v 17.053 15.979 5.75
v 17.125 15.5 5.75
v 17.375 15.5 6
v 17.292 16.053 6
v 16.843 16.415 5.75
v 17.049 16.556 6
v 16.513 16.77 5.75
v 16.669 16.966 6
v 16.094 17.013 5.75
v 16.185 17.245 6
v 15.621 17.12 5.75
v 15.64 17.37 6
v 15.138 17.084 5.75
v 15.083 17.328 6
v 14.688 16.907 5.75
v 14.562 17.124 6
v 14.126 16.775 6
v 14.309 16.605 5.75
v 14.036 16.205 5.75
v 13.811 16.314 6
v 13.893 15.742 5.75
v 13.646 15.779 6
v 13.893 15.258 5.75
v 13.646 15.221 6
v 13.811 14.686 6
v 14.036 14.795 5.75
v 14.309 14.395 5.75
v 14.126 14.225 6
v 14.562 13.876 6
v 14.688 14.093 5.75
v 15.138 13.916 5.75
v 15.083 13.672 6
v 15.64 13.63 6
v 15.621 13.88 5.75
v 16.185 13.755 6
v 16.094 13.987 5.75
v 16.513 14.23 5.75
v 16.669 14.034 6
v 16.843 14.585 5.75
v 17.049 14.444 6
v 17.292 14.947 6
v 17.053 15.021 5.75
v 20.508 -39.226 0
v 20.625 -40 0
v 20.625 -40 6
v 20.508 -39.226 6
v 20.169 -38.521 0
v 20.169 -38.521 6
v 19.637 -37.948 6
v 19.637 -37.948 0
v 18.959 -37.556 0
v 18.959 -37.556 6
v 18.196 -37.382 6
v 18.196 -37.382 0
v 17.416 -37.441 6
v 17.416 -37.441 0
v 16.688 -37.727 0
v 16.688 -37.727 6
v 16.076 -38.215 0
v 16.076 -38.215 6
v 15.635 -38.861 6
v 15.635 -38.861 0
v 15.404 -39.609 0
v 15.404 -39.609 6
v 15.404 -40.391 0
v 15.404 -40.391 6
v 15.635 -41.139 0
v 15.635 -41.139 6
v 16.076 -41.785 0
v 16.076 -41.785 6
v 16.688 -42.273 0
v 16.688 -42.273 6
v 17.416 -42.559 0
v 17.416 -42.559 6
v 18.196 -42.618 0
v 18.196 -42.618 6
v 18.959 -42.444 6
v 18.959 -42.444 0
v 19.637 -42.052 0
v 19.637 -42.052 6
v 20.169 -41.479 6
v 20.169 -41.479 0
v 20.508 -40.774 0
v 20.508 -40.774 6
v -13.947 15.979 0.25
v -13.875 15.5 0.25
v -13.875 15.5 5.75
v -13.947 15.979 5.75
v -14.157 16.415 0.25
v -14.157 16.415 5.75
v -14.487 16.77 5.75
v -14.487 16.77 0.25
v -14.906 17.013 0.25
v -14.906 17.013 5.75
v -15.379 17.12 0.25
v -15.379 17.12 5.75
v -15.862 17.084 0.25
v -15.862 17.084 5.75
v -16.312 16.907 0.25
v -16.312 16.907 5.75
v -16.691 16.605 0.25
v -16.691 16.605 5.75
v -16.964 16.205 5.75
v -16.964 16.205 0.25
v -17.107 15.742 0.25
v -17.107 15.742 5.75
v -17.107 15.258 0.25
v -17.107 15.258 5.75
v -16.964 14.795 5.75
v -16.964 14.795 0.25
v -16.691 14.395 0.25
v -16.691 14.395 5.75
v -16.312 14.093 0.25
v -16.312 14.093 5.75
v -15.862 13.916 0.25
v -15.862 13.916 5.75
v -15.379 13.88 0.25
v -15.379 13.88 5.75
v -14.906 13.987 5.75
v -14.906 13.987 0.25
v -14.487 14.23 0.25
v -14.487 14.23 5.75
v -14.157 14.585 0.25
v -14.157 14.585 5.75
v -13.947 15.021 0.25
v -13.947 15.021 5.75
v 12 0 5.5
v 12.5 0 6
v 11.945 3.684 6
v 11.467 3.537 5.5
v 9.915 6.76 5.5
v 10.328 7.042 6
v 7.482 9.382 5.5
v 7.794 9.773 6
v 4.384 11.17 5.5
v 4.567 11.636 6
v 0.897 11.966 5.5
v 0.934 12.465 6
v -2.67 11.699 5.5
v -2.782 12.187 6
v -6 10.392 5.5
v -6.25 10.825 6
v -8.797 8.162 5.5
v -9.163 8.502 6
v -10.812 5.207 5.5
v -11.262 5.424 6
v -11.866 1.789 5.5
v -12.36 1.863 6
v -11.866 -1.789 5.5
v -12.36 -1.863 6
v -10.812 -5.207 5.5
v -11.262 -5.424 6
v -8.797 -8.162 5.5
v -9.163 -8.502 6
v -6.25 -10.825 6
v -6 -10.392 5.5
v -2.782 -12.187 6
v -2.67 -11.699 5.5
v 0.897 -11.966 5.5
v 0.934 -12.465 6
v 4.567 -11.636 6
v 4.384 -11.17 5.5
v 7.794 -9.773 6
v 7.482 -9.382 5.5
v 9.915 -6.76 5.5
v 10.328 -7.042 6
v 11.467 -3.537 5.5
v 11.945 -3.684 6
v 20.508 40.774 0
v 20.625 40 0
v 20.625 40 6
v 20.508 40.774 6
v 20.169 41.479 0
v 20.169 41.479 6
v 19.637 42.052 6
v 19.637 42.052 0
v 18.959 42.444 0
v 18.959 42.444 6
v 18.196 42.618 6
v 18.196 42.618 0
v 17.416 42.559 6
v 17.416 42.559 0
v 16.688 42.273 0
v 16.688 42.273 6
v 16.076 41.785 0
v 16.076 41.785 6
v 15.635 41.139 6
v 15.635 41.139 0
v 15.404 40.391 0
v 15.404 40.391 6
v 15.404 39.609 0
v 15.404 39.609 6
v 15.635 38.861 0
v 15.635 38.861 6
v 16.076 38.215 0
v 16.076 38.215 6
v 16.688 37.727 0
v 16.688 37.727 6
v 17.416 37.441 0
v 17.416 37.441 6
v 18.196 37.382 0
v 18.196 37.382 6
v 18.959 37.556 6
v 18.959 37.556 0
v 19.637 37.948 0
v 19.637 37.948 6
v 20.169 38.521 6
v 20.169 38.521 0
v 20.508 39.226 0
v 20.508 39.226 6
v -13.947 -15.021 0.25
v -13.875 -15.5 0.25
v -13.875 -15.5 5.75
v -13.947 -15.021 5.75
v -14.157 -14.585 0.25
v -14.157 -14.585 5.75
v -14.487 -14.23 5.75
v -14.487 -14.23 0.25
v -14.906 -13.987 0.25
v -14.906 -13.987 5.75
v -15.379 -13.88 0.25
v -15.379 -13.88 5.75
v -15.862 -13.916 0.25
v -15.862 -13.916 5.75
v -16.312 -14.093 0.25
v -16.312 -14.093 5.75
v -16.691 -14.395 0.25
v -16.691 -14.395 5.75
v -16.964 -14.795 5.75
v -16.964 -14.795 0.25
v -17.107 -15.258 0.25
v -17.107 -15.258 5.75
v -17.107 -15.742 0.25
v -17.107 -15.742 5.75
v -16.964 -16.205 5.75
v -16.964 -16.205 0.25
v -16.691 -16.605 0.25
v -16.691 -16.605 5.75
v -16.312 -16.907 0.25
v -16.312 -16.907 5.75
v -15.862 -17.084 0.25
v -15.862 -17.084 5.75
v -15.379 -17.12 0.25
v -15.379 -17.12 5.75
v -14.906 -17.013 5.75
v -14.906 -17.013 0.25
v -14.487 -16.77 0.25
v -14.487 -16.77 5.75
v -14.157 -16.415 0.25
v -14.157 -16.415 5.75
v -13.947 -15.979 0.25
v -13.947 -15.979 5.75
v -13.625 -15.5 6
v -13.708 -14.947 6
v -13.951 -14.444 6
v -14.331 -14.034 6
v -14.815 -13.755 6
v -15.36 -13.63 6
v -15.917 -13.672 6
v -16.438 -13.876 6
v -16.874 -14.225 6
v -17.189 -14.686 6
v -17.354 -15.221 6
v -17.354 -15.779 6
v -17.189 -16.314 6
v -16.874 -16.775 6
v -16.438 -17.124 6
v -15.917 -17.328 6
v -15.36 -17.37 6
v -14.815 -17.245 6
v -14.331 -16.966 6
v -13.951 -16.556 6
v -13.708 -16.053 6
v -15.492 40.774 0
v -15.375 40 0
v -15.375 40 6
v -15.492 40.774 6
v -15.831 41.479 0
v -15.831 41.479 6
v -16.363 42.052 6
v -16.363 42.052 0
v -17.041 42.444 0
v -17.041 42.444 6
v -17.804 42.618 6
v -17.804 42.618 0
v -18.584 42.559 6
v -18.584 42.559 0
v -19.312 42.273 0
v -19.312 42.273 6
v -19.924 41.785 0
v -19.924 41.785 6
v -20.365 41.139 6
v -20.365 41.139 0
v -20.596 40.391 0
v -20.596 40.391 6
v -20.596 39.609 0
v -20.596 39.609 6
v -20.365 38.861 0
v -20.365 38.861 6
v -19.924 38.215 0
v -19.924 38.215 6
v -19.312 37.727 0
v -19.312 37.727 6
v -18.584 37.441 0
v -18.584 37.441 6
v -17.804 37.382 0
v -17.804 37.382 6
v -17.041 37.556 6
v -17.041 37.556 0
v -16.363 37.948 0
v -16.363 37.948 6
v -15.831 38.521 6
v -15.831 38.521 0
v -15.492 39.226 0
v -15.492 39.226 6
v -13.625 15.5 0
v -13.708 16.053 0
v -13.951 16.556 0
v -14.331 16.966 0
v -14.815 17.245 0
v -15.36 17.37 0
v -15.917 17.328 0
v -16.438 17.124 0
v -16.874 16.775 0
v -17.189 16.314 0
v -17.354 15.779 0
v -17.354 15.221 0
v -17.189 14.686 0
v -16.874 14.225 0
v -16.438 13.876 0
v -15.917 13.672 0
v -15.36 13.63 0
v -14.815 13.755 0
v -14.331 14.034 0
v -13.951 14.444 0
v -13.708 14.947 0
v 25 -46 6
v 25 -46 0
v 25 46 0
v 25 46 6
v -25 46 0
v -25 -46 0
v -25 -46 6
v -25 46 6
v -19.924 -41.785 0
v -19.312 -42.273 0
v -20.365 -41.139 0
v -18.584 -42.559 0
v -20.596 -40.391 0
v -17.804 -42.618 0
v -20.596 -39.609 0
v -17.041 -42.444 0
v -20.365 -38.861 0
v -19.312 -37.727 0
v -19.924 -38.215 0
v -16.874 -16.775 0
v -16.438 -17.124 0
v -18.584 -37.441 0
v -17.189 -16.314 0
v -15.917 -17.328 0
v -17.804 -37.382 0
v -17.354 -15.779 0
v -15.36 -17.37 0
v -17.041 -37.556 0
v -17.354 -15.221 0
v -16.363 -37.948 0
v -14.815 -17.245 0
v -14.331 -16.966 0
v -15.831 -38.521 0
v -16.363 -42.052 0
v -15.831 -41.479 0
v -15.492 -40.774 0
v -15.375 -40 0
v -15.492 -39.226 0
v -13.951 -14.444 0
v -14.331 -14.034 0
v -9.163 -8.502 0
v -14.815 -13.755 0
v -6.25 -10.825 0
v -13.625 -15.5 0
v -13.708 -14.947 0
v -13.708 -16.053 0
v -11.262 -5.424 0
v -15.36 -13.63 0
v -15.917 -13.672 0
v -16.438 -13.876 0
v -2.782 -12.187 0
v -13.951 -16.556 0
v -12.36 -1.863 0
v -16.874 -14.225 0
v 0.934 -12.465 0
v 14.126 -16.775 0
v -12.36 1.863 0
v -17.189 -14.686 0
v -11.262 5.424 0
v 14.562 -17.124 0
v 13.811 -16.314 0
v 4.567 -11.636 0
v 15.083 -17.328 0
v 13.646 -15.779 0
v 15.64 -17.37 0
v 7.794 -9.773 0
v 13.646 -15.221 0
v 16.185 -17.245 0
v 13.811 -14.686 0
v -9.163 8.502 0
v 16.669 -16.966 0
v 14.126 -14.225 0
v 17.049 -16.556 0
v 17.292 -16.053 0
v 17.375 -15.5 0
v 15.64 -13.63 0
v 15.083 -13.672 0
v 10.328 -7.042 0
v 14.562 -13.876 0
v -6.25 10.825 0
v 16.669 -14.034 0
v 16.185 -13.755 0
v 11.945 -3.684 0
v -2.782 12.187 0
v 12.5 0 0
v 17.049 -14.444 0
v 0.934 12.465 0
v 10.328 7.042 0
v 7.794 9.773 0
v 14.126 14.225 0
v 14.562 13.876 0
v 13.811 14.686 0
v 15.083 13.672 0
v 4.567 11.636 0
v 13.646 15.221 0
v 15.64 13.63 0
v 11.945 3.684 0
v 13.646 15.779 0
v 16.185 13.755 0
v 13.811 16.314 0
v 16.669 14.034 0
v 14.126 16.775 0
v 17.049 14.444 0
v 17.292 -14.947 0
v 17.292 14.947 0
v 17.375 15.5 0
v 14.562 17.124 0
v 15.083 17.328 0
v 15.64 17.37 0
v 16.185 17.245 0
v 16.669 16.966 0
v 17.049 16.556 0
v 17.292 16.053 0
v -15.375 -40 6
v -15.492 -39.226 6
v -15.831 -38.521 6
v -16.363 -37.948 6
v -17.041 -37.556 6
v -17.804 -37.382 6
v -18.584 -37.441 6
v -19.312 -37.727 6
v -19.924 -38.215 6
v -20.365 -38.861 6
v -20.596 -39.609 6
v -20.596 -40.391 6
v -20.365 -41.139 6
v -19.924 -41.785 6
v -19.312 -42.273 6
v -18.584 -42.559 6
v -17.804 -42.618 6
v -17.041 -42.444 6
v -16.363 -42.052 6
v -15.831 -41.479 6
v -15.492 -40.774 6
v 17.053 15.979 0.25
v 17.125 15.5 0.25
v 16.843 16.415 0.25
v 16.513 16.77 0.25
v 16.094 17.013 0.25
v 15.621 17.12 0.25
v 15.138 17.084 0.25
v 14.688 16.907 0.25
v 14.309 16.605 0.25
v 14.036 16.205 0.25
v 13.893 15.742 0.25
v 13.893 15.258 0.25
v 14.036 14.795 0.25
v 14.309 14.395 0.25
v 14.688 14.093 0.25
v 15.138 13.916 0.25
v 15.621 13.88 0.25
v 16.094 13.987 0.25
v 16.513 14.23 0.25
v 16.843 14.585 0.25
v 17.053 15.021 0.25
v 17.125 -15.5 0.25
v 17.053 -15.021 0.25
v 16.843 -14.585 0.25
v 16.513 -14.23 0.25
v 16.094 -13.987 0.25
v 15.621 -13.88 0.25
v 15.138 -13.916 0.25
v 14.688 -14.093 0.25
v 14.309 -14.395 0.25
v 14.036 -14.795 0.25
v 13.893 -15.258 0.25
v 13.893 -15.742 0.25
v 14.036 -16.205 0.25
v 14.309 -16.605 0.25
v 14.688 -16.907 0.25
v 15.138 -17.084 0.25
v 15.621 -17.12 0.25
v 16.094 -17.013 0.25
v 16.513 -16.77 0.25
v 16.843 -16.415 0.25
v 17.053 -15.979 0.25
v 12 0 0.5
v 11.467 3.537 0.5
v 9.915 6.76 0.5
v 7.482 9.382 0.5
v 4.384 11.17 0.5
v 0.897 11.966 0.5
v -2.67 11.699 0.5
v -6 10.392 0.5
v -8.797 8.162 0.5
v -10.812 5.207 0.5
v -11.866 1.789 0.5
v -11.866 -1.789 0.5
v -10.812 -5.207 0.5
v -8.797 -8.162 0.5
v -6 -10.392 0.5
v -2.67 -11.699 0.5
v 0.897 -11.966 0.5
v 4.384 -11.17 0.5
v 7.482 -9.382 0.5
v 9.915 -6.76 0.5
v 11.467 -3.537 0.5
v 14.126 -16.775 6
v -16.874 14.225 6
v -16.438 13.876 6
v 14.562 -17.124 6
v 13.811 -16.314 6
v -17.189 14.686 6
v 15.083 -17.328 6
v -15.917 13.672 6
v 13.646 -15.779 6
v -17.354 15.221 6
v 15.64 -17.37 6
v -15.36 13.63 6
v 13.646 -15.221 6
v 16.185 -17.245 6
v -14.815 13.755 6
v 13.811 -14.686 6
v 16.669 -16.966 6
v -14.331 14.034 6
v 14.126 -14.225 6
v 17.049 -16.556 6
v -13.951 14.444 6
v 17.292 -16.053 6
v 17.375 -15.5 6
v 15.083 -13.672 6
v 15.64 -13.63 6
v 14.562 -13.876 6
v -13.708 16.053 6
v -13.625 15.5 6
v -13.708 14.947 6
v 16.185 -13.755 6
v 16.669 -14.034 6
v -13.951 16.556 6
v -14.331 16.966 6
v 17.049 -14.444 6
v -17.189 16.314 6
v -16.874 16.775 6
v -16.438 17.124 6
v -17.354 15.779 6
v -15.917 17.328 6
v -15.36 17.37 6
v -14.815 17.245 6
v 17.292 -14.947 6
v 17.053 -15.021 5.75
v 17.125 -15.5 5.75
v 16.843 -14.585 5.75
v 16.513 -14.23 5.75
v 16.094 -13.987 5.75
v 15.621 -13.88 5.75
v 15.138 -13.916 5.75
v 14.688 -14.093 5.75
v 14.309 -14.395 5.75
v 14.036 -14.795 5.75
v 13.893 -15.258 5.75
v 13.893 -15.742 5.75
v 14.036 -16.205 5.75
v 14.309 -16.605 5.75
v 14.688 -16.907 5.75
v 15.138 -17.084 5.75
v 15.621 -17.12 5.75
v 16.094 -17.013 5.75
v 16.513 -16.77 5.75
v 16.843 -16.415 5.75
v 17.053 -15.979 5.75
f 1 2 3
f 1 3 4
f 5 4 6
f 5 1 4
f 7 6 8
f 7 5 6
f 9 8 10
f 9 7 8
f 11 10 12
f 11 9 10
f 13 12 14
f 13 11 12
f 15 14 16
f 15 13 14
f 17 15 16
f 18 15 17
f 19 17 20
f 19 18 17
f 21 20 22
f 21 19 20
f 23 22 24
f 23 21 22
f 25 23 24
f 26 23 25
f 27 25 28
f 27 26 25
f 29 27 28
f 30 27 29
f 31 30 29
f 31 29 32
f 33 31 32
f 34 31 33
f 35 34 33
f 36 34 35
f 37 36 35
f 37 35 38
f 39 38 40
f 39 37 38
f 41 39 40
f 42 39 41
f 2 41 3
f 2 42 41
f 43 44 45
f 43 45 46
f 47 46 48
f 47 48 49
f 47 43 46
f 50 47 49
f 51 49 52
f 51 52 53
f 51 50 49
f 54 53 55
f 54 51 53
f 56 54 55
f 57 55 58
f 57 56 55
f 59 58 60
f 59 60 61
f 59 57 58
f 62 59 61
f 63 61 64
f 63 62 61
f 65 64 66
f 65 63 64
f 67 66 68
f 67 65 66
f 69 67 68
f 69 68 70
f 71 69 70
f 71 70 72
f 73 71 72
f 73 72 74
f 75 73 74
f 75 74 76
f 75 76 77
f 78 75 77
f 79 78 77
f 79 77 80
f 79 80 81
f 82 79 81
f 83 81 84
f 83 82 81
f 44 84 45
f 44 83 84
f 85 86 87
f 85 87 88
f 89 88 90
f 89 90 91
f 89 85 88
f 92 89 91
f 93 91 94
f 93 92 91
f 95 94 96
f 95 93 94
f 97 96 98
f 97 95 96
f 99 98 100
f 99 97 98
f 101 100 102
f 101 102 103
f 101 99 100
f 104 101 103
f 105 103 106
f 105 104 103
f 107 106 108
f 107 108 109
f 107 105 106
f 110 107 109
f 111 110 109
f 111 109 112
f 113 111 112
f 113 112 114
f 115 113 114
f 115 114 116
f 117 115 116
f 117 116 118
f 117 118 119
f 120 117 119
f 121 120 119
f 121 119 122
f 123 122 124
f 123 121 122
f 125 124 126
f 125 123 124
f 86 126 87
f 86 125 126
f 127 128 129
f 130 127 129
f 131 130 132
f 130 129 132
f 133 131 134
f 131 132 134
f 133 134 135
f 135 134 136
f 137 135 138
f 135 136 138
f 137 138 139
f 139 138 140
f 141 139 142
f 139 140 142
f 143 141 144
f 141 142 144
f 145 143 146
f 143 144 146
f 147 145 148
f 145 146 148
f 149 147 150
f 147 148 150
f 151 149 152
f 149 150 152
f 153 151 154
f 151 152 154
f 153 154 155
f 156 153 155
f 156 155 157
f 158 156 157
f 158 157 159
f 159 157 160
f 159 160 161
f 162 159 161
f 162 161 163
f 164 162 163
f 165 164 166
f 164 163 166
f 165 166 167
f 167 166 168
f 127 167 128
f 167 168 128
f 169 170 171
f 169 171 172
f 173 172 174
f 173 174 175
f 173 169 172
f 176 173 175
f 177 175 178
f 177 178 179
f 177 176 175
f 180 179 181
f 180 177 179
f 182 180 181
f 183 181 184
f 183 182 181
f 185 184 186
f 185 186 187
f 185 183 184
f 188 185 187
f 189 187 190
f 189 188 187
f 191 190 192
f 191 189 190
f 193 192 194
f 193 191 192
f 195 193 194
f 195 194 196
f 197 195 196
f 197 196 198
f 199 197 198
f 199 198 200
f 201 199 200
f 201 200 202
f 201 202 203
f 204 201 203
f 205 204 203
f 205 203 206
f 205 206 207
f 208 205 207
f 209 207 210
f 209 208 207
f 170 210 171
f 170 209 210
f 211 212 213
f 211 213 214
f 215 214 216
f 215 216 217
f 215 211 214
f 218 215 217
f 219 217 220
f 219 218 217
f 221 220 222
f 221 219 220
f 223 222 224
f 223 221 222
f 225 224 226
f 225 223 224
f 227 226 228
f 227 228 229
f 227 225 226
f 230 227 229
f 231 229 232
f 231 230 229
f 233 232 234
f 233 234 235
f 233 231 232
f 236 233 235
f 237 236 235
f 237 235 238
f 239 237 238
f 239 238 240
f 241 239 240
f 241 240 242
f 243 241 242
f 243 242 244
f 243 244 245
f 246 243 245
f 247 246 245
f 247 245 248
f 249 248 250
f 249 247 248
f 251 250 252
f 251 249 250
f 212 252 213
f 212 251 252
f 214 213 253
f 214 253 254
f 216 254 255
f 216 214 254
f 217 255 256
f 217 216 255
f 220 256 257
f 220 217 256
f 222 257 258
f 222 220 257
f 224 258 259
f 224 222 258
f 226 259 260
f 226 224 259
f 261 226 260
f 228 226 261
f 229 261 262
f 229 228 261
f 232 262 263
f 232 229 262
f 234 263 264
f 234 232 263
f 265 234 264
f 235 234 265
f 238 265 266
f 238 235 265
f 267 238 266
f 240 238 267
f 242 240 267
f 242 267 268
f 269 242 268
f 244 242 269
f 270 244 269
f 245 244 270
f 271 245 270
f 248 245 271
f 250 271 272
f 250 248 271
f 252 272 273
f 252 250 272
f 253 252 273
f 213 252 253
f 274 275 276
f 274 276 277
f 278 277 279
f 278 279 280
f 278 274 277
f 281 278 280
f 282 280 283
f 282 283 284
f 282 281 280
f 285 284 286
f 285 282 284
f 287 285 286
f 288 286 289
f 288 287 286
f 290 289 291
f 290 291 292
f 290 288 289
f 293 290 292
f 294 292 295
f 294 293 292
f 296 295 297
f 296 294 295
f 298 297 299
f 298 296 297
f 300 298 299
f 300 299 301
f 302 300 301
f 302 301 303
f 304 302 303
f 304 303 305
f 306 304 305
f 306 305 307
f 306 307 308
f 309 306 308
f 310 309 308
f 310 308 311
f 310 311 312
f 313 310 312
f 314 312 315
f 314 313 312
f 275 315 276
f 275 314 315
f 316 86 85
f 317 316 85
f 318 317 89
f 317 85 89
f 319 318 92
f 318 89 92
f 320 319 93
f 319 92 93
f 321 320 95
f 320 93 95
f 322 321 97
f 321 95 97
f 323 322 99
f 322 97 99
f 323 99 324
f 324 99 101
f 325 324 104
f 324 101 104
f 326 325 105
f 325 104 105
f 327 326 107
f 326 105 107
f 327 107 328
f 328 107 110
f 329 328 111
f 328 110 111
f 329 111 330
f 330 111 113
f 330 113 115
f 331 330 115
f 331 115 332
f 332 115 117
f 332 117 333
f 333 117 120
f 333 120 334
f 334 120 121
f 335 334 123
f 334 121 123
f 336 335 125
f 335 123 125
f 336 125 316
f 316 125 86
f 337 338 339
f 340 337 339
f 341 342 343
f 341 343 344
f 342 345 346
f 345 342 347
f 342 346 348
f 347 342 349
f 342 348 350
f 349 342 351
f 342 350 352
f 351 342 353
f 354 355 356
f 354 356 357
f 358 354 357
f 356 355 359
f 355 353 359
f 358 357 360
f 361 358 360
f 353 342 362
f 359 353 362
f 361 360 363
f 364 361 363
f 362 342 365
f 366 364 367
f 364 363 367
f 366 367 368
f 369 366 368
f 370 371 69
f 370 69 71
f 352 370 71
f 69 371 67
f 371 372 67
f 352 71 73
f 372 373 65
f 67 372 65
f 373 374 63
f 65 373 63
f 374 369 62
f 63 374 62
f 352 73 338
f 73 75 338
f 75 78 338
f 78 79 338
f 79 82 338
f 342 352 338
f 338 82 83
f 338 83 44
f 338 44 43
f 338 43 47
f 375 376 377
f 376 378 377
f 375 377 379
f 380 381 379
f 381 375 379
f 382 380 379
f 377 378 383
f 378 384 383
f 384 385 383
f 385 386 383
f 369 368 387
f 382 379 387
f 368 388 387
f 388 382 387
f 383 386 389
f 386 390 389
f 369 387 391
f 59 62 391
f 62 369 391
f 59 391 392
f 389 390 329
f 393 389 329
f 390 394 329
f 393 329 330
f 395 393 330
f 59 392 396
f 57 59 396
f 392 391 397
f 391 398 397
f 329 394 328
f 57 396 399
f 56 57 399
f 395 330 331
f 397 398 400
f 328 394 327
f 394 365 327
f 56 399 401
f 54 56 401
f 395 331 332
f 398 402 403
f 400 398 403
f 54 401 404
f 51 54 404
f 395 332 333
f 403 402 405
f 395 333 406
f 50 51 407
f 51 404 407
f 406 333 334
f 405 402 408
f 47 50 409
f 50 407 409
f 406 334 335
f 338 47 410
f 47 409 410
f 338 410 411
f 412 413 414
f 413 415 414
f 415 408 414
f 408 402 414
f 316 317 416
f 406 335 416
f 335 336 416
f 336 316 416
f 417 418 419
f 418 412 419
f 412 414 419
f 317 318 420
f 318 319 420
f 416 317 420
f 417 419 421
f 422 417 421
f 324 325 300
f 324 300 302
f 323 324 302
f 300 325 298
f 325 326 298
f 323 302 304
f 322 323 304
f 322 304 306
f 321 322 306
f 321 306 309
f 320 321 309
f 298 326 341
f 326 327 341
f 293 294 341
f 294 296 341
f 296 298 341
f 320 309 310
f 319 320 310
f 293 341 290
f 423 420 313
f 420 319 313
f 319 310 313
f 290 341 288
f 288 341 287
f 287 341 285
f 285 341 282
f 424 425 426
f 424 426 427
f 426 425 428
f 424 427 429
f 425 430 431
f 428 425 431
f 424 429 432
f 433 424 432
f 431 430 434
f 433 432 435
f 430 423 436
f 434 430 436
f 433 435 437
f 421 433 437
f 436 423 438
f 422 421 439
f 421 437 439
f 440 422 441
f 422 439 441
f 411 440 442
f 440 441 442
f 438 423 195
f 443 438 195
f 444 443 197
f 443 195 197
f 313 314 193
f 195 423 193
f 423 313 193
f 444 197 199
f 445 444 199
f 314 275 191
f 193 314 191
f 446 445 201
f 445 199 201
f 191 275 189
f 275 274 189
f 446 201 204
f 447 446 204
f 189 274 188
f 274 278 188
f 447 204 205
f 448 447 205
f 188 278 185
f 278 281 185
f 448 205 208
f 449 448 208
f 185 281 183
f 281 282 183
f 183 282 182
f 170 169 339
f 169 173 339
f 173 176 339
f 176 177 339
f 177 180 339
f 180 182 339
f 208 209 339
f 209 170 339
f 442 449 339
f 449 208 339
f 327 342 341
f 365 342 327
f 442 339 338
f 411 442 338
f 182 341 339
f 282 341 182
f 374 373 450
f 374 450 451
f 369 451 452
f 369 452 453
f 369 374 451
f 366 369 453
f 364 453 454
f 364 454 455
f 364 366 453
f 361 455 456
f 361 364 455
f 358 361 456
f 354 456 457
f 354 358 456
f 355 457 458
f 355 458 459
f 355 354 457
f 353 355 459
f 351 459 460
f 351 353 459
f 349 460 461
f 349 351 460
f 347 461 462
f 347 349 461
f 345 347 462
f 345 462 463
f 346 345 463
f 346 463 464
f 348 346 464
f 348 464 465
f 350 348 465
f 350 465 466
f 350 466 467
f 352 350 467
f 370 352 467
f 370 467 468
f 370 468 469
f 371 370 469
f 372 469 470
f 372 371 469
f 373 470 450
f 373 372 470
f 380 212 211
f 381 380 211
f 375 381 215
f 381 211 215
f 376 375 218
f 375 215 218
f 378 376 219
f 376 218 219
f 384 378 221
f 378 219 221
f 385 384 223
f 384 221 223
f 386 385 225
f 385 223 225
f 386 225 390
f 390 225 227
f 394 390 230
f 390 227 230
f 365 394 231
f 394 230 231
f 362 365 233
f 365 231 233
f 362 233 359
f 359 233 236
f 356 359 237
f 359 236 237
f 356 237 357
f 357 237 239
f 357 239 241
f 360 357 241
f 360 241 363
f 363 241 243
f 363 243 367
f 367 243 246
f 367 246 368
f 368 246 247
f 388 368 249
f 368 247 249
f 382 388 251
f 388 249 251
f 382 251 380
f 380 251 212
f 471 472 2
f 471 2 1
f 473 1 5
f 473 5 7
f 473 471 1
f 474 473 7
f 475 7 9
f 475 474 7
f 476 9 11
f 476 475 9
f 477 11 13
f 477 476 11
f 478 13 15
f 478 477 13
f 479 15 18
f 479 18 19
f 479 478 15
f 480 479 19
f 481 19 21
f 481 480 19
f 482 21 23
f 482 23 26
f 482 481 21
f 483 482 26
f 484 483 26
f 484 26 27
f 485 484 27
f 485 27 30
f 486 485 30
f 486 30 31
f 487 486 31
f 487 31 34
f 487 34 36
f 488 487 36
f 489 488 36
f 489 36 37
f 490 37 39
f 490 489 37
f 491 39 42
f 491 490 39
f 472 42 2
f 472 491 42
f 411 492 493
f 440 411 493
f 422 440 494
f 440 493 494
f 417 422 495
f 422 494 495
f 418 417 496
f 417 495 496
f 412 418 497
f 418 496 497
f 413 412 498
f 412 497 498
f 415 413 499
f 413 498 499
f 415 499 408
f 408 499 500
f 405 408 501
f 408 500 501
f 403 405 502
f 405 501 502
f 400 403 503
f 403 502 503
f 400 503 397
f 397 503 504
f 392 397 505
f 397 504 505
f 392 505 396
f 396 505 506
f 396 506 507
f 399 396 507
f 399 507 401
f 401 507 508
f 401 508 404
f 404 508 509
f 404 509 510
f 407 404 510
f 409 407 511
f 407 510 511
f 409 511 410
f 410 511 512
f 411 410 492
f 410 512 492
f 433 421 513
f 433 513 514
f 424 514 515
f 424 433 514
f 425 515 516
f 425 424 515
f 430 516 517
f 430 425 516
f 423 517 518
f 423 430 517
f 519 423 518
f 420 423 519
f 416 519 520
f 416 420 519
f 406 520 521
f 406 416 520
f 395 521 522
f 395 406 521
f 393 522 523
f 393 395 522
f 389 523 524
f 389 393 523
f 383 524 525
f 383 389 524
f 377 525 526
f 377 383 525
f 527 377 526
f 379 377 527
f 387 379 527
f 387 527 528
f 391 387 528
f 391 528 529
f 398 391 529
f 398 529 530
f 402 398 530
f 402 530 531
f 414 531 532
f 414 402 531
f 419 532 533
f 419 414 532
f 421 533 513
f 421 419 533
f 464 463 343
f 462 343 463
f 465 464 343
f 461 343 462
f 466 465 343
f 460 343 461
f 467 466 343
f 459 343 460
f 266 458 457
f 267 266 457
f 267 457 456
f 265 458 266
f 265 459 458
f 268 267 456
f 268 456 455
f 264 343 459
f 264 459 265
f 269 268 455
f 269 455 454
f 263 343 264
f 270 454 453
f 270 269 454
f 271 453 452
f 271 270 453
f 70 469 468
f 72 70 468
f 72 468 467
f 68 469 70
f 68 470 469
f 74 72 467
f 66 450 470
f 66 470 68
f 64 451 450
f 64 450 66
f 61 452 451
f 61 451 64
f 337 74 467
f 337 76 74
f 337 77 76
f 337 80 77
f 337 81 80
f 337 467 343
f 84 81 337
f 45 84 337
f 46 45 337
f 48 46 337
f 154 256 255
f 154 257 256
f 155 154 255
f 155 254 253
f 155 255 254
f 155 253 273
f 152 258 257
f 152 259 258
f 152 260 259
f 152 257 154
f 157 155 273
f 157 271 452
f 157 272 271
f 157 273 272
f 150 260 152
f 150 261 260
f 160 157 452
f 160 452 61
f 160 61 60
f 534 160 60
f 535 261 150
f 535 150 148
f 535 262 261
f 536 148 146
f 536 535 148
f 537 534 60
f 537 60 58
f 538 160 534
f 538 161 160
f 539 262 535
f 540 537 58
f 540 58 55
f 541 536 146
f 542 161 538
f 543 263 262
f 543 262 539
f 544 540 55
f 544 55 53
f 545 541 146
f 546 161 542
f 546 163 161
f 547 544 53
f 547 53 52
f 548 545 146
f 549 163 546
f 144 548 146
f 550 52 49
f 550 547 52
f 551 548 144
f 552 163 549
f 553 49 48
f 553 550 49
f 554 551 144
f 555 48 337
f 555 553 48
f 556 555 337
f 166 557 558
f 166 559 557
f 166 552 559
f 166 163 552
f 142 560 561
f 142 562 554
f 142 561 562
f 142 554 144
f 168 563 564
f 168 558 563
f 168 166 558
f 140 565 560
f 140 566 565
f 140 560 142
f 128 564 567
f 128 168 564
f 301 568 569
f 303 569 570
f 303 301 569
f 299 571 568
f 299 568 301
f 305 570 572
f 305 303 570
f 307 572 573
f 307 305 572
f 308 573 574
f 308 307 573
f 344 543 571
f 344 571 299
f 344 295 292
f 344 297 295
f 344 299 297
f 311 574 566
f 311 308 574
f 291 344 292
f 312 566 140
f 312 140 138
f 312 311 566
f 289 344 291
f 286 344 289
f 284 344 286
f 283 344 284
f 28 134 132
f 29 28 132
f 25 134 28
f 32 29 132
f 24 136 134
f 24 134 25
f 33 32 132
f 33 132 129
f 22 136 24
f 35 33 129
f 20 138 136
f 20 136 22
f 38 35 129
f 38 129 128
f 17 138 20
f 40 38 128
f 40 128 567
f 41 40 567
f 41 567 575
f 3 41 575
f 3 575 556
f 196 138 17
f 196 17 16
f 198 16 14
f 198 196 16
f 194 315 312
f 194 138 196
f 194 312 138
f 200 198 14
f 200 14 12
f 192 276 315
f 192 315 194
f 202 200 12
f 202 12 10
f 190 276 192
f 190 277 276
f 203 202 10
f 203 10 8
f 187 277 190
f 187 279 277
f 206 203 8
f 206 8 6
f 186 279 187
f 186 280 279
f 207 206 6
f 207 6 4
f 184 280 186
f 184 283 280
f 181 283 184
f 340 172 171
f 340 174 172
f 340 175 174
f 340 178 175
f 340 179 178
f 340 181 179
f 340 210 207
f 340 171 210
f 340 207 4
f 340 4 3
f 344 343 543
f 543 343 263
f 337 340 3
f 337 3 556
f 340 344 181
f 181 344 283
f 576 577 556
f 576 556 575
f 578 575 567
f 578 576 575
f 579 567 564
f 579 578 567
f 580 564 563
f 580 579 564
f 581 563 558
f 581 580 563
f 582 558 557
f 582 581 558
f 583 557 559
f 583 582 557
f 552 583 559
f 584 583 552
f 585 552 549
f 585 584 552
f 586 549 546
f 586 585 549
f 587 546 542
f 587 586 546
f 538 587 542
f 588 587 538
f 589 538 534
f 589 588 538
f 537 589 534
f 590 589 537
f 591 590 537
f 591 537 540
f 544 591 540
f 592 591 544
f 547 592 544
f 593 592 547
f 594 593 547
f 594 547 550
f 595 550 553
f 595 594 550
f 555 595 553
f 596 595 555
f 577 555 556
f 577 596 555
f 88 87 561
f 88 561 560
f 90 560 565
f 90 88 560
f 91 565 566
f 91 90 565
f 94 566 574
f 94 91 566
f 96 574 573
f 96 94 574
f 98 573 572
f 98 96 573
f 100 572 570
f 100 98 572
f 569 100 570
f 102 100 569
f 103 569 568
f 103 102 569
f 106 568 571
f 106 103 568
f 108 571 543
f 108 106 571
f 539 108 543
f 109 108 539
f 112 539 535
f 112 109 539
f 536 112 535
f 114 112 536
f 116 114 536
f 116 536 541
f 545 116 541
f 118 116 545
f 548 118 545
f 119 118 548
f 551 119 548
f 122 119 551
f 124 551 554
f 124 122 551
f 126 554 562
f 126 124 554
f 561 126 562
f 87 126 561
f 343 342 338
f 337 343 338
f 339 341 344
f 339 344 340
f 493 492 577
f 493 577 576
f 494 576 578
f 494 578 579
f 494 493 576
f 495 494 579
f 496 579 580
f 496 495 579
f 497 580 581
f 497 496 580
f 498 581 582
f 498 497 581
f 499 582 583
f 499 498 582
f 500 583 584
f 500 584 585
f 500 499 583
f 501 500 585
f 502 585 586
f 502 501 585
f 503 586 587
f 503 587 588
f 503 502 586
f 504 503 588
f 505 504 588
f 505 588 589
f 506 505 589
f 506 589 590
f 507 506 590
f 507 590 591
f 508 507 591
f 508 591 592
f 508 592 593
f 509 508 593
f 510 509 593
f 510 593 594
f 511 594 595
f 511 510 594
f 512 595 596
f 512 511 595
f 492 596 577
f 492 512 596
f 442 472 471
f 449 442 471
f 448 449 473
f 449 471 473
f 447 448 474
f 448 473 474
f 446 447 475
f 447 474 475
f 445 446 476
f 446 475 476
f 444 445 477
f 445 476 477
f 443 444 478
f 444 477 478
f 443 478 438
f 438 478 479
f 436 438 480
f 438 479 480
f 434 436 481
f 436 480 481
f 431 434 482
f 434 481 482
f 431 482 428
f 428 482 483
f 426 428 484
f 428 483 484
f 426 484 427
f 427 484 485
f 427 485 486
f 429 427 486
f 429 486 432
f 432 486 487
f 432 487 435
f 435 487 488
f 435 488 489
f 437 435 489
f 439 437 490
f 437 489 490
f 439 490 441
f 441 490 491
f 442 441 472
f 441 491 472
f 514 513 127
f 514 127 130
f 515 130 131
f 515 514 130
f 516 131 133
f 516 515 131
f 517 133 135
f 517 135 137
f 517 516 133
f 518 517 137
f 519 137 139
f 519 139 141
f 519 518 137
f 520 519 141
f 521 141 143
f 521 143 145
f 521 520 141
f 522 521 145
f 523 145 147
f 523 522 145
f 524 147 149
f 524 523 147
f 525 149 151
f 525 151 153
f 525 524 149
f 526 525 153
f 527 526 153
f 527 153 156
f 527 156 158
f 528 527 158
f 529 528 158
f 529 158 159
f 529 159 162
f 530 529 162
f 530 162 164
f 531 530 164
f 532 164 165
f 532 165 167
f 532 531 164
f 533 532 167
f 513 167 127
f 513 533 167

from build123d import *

# Parameters (mm, degrees)
SKETCH_W        = 50
SKETCH_H        = 92
SKETCH_R        = 2.625
SKETCH_R_2      = 1.625
SKETCH_R_3      = 12
PAD_DEPTH       = 6
CHAMFER_SIZE    = 0.5
CHAMFER001_SIZE = 0.25


with BuildPart() as part:
    # Sketch → Pad (new body)
    with BuildSketch(Plane.XY):
        Rectangle(SKETCH_W, SKETCH_H)
        with Locations((-18, 40)):
            Circle(SKETCH_R, mode=Mode.SUBTRACT)
        with Locations((18, 40)):
            Circle(SKETCH_R, mode=Mode.SUBTRACT)
        with Locations((-18, -40)):
            Circle(SKETCH_R, mode=Mode.SUBTRACT)
        with Locations((18, -40)):
            Circle(SKETCH_R, mode=Mode.SUBTRACT)
        with Locations((-15.5, 15.5)):
            Circle(SKETCH_R_2, mode=Mode.SUBTRACT)
        with Locations((15.5, 15.5)):
            Circle(SKETCH_R_2, mode=Mode.SUBTRACT)
        with Locations((-15.5, -15.5)):
            Circle(SKETCH_R_2, mode=Mode.SUBTRACT)
        with Locations((15.5, -15.5)):
            Circle(SKETCH_R_2, mode=Mode.SUBTRACT)
        Circle(SKETCH_R_3, mode=Mode.SUBTRACT)
    extrude(amount=PAD_DEPTH)

    # Chamfer
    chamfer_edges = [part.edges().sort_by_distance(p)[0] for p in [
        (-12, 0, 6),
        (-12, 0, 0),
    ]]
    chamfer(chamfer_edges, length=CHAMFER_SIZE)

    # Chamfer001
    chamfer001_edges = [part.edges().sort_by_distance(p)[0] for p in [
        (-17.125, 15.5, 6),
        (-17.125, -15.5, 6),
        (13.875, -15.5, 6),
        (13.875, 15.5, 6),
        (13.875, -15.5, 0),
        (13.875, 15.5, 0),
        (-17.125, -15.5, 0),
        (-17.125, 15.5, 0),
    ]]
    chamfer(chamfer001_edges, length=CHAMFER001_SIZE)


solid = part.part
